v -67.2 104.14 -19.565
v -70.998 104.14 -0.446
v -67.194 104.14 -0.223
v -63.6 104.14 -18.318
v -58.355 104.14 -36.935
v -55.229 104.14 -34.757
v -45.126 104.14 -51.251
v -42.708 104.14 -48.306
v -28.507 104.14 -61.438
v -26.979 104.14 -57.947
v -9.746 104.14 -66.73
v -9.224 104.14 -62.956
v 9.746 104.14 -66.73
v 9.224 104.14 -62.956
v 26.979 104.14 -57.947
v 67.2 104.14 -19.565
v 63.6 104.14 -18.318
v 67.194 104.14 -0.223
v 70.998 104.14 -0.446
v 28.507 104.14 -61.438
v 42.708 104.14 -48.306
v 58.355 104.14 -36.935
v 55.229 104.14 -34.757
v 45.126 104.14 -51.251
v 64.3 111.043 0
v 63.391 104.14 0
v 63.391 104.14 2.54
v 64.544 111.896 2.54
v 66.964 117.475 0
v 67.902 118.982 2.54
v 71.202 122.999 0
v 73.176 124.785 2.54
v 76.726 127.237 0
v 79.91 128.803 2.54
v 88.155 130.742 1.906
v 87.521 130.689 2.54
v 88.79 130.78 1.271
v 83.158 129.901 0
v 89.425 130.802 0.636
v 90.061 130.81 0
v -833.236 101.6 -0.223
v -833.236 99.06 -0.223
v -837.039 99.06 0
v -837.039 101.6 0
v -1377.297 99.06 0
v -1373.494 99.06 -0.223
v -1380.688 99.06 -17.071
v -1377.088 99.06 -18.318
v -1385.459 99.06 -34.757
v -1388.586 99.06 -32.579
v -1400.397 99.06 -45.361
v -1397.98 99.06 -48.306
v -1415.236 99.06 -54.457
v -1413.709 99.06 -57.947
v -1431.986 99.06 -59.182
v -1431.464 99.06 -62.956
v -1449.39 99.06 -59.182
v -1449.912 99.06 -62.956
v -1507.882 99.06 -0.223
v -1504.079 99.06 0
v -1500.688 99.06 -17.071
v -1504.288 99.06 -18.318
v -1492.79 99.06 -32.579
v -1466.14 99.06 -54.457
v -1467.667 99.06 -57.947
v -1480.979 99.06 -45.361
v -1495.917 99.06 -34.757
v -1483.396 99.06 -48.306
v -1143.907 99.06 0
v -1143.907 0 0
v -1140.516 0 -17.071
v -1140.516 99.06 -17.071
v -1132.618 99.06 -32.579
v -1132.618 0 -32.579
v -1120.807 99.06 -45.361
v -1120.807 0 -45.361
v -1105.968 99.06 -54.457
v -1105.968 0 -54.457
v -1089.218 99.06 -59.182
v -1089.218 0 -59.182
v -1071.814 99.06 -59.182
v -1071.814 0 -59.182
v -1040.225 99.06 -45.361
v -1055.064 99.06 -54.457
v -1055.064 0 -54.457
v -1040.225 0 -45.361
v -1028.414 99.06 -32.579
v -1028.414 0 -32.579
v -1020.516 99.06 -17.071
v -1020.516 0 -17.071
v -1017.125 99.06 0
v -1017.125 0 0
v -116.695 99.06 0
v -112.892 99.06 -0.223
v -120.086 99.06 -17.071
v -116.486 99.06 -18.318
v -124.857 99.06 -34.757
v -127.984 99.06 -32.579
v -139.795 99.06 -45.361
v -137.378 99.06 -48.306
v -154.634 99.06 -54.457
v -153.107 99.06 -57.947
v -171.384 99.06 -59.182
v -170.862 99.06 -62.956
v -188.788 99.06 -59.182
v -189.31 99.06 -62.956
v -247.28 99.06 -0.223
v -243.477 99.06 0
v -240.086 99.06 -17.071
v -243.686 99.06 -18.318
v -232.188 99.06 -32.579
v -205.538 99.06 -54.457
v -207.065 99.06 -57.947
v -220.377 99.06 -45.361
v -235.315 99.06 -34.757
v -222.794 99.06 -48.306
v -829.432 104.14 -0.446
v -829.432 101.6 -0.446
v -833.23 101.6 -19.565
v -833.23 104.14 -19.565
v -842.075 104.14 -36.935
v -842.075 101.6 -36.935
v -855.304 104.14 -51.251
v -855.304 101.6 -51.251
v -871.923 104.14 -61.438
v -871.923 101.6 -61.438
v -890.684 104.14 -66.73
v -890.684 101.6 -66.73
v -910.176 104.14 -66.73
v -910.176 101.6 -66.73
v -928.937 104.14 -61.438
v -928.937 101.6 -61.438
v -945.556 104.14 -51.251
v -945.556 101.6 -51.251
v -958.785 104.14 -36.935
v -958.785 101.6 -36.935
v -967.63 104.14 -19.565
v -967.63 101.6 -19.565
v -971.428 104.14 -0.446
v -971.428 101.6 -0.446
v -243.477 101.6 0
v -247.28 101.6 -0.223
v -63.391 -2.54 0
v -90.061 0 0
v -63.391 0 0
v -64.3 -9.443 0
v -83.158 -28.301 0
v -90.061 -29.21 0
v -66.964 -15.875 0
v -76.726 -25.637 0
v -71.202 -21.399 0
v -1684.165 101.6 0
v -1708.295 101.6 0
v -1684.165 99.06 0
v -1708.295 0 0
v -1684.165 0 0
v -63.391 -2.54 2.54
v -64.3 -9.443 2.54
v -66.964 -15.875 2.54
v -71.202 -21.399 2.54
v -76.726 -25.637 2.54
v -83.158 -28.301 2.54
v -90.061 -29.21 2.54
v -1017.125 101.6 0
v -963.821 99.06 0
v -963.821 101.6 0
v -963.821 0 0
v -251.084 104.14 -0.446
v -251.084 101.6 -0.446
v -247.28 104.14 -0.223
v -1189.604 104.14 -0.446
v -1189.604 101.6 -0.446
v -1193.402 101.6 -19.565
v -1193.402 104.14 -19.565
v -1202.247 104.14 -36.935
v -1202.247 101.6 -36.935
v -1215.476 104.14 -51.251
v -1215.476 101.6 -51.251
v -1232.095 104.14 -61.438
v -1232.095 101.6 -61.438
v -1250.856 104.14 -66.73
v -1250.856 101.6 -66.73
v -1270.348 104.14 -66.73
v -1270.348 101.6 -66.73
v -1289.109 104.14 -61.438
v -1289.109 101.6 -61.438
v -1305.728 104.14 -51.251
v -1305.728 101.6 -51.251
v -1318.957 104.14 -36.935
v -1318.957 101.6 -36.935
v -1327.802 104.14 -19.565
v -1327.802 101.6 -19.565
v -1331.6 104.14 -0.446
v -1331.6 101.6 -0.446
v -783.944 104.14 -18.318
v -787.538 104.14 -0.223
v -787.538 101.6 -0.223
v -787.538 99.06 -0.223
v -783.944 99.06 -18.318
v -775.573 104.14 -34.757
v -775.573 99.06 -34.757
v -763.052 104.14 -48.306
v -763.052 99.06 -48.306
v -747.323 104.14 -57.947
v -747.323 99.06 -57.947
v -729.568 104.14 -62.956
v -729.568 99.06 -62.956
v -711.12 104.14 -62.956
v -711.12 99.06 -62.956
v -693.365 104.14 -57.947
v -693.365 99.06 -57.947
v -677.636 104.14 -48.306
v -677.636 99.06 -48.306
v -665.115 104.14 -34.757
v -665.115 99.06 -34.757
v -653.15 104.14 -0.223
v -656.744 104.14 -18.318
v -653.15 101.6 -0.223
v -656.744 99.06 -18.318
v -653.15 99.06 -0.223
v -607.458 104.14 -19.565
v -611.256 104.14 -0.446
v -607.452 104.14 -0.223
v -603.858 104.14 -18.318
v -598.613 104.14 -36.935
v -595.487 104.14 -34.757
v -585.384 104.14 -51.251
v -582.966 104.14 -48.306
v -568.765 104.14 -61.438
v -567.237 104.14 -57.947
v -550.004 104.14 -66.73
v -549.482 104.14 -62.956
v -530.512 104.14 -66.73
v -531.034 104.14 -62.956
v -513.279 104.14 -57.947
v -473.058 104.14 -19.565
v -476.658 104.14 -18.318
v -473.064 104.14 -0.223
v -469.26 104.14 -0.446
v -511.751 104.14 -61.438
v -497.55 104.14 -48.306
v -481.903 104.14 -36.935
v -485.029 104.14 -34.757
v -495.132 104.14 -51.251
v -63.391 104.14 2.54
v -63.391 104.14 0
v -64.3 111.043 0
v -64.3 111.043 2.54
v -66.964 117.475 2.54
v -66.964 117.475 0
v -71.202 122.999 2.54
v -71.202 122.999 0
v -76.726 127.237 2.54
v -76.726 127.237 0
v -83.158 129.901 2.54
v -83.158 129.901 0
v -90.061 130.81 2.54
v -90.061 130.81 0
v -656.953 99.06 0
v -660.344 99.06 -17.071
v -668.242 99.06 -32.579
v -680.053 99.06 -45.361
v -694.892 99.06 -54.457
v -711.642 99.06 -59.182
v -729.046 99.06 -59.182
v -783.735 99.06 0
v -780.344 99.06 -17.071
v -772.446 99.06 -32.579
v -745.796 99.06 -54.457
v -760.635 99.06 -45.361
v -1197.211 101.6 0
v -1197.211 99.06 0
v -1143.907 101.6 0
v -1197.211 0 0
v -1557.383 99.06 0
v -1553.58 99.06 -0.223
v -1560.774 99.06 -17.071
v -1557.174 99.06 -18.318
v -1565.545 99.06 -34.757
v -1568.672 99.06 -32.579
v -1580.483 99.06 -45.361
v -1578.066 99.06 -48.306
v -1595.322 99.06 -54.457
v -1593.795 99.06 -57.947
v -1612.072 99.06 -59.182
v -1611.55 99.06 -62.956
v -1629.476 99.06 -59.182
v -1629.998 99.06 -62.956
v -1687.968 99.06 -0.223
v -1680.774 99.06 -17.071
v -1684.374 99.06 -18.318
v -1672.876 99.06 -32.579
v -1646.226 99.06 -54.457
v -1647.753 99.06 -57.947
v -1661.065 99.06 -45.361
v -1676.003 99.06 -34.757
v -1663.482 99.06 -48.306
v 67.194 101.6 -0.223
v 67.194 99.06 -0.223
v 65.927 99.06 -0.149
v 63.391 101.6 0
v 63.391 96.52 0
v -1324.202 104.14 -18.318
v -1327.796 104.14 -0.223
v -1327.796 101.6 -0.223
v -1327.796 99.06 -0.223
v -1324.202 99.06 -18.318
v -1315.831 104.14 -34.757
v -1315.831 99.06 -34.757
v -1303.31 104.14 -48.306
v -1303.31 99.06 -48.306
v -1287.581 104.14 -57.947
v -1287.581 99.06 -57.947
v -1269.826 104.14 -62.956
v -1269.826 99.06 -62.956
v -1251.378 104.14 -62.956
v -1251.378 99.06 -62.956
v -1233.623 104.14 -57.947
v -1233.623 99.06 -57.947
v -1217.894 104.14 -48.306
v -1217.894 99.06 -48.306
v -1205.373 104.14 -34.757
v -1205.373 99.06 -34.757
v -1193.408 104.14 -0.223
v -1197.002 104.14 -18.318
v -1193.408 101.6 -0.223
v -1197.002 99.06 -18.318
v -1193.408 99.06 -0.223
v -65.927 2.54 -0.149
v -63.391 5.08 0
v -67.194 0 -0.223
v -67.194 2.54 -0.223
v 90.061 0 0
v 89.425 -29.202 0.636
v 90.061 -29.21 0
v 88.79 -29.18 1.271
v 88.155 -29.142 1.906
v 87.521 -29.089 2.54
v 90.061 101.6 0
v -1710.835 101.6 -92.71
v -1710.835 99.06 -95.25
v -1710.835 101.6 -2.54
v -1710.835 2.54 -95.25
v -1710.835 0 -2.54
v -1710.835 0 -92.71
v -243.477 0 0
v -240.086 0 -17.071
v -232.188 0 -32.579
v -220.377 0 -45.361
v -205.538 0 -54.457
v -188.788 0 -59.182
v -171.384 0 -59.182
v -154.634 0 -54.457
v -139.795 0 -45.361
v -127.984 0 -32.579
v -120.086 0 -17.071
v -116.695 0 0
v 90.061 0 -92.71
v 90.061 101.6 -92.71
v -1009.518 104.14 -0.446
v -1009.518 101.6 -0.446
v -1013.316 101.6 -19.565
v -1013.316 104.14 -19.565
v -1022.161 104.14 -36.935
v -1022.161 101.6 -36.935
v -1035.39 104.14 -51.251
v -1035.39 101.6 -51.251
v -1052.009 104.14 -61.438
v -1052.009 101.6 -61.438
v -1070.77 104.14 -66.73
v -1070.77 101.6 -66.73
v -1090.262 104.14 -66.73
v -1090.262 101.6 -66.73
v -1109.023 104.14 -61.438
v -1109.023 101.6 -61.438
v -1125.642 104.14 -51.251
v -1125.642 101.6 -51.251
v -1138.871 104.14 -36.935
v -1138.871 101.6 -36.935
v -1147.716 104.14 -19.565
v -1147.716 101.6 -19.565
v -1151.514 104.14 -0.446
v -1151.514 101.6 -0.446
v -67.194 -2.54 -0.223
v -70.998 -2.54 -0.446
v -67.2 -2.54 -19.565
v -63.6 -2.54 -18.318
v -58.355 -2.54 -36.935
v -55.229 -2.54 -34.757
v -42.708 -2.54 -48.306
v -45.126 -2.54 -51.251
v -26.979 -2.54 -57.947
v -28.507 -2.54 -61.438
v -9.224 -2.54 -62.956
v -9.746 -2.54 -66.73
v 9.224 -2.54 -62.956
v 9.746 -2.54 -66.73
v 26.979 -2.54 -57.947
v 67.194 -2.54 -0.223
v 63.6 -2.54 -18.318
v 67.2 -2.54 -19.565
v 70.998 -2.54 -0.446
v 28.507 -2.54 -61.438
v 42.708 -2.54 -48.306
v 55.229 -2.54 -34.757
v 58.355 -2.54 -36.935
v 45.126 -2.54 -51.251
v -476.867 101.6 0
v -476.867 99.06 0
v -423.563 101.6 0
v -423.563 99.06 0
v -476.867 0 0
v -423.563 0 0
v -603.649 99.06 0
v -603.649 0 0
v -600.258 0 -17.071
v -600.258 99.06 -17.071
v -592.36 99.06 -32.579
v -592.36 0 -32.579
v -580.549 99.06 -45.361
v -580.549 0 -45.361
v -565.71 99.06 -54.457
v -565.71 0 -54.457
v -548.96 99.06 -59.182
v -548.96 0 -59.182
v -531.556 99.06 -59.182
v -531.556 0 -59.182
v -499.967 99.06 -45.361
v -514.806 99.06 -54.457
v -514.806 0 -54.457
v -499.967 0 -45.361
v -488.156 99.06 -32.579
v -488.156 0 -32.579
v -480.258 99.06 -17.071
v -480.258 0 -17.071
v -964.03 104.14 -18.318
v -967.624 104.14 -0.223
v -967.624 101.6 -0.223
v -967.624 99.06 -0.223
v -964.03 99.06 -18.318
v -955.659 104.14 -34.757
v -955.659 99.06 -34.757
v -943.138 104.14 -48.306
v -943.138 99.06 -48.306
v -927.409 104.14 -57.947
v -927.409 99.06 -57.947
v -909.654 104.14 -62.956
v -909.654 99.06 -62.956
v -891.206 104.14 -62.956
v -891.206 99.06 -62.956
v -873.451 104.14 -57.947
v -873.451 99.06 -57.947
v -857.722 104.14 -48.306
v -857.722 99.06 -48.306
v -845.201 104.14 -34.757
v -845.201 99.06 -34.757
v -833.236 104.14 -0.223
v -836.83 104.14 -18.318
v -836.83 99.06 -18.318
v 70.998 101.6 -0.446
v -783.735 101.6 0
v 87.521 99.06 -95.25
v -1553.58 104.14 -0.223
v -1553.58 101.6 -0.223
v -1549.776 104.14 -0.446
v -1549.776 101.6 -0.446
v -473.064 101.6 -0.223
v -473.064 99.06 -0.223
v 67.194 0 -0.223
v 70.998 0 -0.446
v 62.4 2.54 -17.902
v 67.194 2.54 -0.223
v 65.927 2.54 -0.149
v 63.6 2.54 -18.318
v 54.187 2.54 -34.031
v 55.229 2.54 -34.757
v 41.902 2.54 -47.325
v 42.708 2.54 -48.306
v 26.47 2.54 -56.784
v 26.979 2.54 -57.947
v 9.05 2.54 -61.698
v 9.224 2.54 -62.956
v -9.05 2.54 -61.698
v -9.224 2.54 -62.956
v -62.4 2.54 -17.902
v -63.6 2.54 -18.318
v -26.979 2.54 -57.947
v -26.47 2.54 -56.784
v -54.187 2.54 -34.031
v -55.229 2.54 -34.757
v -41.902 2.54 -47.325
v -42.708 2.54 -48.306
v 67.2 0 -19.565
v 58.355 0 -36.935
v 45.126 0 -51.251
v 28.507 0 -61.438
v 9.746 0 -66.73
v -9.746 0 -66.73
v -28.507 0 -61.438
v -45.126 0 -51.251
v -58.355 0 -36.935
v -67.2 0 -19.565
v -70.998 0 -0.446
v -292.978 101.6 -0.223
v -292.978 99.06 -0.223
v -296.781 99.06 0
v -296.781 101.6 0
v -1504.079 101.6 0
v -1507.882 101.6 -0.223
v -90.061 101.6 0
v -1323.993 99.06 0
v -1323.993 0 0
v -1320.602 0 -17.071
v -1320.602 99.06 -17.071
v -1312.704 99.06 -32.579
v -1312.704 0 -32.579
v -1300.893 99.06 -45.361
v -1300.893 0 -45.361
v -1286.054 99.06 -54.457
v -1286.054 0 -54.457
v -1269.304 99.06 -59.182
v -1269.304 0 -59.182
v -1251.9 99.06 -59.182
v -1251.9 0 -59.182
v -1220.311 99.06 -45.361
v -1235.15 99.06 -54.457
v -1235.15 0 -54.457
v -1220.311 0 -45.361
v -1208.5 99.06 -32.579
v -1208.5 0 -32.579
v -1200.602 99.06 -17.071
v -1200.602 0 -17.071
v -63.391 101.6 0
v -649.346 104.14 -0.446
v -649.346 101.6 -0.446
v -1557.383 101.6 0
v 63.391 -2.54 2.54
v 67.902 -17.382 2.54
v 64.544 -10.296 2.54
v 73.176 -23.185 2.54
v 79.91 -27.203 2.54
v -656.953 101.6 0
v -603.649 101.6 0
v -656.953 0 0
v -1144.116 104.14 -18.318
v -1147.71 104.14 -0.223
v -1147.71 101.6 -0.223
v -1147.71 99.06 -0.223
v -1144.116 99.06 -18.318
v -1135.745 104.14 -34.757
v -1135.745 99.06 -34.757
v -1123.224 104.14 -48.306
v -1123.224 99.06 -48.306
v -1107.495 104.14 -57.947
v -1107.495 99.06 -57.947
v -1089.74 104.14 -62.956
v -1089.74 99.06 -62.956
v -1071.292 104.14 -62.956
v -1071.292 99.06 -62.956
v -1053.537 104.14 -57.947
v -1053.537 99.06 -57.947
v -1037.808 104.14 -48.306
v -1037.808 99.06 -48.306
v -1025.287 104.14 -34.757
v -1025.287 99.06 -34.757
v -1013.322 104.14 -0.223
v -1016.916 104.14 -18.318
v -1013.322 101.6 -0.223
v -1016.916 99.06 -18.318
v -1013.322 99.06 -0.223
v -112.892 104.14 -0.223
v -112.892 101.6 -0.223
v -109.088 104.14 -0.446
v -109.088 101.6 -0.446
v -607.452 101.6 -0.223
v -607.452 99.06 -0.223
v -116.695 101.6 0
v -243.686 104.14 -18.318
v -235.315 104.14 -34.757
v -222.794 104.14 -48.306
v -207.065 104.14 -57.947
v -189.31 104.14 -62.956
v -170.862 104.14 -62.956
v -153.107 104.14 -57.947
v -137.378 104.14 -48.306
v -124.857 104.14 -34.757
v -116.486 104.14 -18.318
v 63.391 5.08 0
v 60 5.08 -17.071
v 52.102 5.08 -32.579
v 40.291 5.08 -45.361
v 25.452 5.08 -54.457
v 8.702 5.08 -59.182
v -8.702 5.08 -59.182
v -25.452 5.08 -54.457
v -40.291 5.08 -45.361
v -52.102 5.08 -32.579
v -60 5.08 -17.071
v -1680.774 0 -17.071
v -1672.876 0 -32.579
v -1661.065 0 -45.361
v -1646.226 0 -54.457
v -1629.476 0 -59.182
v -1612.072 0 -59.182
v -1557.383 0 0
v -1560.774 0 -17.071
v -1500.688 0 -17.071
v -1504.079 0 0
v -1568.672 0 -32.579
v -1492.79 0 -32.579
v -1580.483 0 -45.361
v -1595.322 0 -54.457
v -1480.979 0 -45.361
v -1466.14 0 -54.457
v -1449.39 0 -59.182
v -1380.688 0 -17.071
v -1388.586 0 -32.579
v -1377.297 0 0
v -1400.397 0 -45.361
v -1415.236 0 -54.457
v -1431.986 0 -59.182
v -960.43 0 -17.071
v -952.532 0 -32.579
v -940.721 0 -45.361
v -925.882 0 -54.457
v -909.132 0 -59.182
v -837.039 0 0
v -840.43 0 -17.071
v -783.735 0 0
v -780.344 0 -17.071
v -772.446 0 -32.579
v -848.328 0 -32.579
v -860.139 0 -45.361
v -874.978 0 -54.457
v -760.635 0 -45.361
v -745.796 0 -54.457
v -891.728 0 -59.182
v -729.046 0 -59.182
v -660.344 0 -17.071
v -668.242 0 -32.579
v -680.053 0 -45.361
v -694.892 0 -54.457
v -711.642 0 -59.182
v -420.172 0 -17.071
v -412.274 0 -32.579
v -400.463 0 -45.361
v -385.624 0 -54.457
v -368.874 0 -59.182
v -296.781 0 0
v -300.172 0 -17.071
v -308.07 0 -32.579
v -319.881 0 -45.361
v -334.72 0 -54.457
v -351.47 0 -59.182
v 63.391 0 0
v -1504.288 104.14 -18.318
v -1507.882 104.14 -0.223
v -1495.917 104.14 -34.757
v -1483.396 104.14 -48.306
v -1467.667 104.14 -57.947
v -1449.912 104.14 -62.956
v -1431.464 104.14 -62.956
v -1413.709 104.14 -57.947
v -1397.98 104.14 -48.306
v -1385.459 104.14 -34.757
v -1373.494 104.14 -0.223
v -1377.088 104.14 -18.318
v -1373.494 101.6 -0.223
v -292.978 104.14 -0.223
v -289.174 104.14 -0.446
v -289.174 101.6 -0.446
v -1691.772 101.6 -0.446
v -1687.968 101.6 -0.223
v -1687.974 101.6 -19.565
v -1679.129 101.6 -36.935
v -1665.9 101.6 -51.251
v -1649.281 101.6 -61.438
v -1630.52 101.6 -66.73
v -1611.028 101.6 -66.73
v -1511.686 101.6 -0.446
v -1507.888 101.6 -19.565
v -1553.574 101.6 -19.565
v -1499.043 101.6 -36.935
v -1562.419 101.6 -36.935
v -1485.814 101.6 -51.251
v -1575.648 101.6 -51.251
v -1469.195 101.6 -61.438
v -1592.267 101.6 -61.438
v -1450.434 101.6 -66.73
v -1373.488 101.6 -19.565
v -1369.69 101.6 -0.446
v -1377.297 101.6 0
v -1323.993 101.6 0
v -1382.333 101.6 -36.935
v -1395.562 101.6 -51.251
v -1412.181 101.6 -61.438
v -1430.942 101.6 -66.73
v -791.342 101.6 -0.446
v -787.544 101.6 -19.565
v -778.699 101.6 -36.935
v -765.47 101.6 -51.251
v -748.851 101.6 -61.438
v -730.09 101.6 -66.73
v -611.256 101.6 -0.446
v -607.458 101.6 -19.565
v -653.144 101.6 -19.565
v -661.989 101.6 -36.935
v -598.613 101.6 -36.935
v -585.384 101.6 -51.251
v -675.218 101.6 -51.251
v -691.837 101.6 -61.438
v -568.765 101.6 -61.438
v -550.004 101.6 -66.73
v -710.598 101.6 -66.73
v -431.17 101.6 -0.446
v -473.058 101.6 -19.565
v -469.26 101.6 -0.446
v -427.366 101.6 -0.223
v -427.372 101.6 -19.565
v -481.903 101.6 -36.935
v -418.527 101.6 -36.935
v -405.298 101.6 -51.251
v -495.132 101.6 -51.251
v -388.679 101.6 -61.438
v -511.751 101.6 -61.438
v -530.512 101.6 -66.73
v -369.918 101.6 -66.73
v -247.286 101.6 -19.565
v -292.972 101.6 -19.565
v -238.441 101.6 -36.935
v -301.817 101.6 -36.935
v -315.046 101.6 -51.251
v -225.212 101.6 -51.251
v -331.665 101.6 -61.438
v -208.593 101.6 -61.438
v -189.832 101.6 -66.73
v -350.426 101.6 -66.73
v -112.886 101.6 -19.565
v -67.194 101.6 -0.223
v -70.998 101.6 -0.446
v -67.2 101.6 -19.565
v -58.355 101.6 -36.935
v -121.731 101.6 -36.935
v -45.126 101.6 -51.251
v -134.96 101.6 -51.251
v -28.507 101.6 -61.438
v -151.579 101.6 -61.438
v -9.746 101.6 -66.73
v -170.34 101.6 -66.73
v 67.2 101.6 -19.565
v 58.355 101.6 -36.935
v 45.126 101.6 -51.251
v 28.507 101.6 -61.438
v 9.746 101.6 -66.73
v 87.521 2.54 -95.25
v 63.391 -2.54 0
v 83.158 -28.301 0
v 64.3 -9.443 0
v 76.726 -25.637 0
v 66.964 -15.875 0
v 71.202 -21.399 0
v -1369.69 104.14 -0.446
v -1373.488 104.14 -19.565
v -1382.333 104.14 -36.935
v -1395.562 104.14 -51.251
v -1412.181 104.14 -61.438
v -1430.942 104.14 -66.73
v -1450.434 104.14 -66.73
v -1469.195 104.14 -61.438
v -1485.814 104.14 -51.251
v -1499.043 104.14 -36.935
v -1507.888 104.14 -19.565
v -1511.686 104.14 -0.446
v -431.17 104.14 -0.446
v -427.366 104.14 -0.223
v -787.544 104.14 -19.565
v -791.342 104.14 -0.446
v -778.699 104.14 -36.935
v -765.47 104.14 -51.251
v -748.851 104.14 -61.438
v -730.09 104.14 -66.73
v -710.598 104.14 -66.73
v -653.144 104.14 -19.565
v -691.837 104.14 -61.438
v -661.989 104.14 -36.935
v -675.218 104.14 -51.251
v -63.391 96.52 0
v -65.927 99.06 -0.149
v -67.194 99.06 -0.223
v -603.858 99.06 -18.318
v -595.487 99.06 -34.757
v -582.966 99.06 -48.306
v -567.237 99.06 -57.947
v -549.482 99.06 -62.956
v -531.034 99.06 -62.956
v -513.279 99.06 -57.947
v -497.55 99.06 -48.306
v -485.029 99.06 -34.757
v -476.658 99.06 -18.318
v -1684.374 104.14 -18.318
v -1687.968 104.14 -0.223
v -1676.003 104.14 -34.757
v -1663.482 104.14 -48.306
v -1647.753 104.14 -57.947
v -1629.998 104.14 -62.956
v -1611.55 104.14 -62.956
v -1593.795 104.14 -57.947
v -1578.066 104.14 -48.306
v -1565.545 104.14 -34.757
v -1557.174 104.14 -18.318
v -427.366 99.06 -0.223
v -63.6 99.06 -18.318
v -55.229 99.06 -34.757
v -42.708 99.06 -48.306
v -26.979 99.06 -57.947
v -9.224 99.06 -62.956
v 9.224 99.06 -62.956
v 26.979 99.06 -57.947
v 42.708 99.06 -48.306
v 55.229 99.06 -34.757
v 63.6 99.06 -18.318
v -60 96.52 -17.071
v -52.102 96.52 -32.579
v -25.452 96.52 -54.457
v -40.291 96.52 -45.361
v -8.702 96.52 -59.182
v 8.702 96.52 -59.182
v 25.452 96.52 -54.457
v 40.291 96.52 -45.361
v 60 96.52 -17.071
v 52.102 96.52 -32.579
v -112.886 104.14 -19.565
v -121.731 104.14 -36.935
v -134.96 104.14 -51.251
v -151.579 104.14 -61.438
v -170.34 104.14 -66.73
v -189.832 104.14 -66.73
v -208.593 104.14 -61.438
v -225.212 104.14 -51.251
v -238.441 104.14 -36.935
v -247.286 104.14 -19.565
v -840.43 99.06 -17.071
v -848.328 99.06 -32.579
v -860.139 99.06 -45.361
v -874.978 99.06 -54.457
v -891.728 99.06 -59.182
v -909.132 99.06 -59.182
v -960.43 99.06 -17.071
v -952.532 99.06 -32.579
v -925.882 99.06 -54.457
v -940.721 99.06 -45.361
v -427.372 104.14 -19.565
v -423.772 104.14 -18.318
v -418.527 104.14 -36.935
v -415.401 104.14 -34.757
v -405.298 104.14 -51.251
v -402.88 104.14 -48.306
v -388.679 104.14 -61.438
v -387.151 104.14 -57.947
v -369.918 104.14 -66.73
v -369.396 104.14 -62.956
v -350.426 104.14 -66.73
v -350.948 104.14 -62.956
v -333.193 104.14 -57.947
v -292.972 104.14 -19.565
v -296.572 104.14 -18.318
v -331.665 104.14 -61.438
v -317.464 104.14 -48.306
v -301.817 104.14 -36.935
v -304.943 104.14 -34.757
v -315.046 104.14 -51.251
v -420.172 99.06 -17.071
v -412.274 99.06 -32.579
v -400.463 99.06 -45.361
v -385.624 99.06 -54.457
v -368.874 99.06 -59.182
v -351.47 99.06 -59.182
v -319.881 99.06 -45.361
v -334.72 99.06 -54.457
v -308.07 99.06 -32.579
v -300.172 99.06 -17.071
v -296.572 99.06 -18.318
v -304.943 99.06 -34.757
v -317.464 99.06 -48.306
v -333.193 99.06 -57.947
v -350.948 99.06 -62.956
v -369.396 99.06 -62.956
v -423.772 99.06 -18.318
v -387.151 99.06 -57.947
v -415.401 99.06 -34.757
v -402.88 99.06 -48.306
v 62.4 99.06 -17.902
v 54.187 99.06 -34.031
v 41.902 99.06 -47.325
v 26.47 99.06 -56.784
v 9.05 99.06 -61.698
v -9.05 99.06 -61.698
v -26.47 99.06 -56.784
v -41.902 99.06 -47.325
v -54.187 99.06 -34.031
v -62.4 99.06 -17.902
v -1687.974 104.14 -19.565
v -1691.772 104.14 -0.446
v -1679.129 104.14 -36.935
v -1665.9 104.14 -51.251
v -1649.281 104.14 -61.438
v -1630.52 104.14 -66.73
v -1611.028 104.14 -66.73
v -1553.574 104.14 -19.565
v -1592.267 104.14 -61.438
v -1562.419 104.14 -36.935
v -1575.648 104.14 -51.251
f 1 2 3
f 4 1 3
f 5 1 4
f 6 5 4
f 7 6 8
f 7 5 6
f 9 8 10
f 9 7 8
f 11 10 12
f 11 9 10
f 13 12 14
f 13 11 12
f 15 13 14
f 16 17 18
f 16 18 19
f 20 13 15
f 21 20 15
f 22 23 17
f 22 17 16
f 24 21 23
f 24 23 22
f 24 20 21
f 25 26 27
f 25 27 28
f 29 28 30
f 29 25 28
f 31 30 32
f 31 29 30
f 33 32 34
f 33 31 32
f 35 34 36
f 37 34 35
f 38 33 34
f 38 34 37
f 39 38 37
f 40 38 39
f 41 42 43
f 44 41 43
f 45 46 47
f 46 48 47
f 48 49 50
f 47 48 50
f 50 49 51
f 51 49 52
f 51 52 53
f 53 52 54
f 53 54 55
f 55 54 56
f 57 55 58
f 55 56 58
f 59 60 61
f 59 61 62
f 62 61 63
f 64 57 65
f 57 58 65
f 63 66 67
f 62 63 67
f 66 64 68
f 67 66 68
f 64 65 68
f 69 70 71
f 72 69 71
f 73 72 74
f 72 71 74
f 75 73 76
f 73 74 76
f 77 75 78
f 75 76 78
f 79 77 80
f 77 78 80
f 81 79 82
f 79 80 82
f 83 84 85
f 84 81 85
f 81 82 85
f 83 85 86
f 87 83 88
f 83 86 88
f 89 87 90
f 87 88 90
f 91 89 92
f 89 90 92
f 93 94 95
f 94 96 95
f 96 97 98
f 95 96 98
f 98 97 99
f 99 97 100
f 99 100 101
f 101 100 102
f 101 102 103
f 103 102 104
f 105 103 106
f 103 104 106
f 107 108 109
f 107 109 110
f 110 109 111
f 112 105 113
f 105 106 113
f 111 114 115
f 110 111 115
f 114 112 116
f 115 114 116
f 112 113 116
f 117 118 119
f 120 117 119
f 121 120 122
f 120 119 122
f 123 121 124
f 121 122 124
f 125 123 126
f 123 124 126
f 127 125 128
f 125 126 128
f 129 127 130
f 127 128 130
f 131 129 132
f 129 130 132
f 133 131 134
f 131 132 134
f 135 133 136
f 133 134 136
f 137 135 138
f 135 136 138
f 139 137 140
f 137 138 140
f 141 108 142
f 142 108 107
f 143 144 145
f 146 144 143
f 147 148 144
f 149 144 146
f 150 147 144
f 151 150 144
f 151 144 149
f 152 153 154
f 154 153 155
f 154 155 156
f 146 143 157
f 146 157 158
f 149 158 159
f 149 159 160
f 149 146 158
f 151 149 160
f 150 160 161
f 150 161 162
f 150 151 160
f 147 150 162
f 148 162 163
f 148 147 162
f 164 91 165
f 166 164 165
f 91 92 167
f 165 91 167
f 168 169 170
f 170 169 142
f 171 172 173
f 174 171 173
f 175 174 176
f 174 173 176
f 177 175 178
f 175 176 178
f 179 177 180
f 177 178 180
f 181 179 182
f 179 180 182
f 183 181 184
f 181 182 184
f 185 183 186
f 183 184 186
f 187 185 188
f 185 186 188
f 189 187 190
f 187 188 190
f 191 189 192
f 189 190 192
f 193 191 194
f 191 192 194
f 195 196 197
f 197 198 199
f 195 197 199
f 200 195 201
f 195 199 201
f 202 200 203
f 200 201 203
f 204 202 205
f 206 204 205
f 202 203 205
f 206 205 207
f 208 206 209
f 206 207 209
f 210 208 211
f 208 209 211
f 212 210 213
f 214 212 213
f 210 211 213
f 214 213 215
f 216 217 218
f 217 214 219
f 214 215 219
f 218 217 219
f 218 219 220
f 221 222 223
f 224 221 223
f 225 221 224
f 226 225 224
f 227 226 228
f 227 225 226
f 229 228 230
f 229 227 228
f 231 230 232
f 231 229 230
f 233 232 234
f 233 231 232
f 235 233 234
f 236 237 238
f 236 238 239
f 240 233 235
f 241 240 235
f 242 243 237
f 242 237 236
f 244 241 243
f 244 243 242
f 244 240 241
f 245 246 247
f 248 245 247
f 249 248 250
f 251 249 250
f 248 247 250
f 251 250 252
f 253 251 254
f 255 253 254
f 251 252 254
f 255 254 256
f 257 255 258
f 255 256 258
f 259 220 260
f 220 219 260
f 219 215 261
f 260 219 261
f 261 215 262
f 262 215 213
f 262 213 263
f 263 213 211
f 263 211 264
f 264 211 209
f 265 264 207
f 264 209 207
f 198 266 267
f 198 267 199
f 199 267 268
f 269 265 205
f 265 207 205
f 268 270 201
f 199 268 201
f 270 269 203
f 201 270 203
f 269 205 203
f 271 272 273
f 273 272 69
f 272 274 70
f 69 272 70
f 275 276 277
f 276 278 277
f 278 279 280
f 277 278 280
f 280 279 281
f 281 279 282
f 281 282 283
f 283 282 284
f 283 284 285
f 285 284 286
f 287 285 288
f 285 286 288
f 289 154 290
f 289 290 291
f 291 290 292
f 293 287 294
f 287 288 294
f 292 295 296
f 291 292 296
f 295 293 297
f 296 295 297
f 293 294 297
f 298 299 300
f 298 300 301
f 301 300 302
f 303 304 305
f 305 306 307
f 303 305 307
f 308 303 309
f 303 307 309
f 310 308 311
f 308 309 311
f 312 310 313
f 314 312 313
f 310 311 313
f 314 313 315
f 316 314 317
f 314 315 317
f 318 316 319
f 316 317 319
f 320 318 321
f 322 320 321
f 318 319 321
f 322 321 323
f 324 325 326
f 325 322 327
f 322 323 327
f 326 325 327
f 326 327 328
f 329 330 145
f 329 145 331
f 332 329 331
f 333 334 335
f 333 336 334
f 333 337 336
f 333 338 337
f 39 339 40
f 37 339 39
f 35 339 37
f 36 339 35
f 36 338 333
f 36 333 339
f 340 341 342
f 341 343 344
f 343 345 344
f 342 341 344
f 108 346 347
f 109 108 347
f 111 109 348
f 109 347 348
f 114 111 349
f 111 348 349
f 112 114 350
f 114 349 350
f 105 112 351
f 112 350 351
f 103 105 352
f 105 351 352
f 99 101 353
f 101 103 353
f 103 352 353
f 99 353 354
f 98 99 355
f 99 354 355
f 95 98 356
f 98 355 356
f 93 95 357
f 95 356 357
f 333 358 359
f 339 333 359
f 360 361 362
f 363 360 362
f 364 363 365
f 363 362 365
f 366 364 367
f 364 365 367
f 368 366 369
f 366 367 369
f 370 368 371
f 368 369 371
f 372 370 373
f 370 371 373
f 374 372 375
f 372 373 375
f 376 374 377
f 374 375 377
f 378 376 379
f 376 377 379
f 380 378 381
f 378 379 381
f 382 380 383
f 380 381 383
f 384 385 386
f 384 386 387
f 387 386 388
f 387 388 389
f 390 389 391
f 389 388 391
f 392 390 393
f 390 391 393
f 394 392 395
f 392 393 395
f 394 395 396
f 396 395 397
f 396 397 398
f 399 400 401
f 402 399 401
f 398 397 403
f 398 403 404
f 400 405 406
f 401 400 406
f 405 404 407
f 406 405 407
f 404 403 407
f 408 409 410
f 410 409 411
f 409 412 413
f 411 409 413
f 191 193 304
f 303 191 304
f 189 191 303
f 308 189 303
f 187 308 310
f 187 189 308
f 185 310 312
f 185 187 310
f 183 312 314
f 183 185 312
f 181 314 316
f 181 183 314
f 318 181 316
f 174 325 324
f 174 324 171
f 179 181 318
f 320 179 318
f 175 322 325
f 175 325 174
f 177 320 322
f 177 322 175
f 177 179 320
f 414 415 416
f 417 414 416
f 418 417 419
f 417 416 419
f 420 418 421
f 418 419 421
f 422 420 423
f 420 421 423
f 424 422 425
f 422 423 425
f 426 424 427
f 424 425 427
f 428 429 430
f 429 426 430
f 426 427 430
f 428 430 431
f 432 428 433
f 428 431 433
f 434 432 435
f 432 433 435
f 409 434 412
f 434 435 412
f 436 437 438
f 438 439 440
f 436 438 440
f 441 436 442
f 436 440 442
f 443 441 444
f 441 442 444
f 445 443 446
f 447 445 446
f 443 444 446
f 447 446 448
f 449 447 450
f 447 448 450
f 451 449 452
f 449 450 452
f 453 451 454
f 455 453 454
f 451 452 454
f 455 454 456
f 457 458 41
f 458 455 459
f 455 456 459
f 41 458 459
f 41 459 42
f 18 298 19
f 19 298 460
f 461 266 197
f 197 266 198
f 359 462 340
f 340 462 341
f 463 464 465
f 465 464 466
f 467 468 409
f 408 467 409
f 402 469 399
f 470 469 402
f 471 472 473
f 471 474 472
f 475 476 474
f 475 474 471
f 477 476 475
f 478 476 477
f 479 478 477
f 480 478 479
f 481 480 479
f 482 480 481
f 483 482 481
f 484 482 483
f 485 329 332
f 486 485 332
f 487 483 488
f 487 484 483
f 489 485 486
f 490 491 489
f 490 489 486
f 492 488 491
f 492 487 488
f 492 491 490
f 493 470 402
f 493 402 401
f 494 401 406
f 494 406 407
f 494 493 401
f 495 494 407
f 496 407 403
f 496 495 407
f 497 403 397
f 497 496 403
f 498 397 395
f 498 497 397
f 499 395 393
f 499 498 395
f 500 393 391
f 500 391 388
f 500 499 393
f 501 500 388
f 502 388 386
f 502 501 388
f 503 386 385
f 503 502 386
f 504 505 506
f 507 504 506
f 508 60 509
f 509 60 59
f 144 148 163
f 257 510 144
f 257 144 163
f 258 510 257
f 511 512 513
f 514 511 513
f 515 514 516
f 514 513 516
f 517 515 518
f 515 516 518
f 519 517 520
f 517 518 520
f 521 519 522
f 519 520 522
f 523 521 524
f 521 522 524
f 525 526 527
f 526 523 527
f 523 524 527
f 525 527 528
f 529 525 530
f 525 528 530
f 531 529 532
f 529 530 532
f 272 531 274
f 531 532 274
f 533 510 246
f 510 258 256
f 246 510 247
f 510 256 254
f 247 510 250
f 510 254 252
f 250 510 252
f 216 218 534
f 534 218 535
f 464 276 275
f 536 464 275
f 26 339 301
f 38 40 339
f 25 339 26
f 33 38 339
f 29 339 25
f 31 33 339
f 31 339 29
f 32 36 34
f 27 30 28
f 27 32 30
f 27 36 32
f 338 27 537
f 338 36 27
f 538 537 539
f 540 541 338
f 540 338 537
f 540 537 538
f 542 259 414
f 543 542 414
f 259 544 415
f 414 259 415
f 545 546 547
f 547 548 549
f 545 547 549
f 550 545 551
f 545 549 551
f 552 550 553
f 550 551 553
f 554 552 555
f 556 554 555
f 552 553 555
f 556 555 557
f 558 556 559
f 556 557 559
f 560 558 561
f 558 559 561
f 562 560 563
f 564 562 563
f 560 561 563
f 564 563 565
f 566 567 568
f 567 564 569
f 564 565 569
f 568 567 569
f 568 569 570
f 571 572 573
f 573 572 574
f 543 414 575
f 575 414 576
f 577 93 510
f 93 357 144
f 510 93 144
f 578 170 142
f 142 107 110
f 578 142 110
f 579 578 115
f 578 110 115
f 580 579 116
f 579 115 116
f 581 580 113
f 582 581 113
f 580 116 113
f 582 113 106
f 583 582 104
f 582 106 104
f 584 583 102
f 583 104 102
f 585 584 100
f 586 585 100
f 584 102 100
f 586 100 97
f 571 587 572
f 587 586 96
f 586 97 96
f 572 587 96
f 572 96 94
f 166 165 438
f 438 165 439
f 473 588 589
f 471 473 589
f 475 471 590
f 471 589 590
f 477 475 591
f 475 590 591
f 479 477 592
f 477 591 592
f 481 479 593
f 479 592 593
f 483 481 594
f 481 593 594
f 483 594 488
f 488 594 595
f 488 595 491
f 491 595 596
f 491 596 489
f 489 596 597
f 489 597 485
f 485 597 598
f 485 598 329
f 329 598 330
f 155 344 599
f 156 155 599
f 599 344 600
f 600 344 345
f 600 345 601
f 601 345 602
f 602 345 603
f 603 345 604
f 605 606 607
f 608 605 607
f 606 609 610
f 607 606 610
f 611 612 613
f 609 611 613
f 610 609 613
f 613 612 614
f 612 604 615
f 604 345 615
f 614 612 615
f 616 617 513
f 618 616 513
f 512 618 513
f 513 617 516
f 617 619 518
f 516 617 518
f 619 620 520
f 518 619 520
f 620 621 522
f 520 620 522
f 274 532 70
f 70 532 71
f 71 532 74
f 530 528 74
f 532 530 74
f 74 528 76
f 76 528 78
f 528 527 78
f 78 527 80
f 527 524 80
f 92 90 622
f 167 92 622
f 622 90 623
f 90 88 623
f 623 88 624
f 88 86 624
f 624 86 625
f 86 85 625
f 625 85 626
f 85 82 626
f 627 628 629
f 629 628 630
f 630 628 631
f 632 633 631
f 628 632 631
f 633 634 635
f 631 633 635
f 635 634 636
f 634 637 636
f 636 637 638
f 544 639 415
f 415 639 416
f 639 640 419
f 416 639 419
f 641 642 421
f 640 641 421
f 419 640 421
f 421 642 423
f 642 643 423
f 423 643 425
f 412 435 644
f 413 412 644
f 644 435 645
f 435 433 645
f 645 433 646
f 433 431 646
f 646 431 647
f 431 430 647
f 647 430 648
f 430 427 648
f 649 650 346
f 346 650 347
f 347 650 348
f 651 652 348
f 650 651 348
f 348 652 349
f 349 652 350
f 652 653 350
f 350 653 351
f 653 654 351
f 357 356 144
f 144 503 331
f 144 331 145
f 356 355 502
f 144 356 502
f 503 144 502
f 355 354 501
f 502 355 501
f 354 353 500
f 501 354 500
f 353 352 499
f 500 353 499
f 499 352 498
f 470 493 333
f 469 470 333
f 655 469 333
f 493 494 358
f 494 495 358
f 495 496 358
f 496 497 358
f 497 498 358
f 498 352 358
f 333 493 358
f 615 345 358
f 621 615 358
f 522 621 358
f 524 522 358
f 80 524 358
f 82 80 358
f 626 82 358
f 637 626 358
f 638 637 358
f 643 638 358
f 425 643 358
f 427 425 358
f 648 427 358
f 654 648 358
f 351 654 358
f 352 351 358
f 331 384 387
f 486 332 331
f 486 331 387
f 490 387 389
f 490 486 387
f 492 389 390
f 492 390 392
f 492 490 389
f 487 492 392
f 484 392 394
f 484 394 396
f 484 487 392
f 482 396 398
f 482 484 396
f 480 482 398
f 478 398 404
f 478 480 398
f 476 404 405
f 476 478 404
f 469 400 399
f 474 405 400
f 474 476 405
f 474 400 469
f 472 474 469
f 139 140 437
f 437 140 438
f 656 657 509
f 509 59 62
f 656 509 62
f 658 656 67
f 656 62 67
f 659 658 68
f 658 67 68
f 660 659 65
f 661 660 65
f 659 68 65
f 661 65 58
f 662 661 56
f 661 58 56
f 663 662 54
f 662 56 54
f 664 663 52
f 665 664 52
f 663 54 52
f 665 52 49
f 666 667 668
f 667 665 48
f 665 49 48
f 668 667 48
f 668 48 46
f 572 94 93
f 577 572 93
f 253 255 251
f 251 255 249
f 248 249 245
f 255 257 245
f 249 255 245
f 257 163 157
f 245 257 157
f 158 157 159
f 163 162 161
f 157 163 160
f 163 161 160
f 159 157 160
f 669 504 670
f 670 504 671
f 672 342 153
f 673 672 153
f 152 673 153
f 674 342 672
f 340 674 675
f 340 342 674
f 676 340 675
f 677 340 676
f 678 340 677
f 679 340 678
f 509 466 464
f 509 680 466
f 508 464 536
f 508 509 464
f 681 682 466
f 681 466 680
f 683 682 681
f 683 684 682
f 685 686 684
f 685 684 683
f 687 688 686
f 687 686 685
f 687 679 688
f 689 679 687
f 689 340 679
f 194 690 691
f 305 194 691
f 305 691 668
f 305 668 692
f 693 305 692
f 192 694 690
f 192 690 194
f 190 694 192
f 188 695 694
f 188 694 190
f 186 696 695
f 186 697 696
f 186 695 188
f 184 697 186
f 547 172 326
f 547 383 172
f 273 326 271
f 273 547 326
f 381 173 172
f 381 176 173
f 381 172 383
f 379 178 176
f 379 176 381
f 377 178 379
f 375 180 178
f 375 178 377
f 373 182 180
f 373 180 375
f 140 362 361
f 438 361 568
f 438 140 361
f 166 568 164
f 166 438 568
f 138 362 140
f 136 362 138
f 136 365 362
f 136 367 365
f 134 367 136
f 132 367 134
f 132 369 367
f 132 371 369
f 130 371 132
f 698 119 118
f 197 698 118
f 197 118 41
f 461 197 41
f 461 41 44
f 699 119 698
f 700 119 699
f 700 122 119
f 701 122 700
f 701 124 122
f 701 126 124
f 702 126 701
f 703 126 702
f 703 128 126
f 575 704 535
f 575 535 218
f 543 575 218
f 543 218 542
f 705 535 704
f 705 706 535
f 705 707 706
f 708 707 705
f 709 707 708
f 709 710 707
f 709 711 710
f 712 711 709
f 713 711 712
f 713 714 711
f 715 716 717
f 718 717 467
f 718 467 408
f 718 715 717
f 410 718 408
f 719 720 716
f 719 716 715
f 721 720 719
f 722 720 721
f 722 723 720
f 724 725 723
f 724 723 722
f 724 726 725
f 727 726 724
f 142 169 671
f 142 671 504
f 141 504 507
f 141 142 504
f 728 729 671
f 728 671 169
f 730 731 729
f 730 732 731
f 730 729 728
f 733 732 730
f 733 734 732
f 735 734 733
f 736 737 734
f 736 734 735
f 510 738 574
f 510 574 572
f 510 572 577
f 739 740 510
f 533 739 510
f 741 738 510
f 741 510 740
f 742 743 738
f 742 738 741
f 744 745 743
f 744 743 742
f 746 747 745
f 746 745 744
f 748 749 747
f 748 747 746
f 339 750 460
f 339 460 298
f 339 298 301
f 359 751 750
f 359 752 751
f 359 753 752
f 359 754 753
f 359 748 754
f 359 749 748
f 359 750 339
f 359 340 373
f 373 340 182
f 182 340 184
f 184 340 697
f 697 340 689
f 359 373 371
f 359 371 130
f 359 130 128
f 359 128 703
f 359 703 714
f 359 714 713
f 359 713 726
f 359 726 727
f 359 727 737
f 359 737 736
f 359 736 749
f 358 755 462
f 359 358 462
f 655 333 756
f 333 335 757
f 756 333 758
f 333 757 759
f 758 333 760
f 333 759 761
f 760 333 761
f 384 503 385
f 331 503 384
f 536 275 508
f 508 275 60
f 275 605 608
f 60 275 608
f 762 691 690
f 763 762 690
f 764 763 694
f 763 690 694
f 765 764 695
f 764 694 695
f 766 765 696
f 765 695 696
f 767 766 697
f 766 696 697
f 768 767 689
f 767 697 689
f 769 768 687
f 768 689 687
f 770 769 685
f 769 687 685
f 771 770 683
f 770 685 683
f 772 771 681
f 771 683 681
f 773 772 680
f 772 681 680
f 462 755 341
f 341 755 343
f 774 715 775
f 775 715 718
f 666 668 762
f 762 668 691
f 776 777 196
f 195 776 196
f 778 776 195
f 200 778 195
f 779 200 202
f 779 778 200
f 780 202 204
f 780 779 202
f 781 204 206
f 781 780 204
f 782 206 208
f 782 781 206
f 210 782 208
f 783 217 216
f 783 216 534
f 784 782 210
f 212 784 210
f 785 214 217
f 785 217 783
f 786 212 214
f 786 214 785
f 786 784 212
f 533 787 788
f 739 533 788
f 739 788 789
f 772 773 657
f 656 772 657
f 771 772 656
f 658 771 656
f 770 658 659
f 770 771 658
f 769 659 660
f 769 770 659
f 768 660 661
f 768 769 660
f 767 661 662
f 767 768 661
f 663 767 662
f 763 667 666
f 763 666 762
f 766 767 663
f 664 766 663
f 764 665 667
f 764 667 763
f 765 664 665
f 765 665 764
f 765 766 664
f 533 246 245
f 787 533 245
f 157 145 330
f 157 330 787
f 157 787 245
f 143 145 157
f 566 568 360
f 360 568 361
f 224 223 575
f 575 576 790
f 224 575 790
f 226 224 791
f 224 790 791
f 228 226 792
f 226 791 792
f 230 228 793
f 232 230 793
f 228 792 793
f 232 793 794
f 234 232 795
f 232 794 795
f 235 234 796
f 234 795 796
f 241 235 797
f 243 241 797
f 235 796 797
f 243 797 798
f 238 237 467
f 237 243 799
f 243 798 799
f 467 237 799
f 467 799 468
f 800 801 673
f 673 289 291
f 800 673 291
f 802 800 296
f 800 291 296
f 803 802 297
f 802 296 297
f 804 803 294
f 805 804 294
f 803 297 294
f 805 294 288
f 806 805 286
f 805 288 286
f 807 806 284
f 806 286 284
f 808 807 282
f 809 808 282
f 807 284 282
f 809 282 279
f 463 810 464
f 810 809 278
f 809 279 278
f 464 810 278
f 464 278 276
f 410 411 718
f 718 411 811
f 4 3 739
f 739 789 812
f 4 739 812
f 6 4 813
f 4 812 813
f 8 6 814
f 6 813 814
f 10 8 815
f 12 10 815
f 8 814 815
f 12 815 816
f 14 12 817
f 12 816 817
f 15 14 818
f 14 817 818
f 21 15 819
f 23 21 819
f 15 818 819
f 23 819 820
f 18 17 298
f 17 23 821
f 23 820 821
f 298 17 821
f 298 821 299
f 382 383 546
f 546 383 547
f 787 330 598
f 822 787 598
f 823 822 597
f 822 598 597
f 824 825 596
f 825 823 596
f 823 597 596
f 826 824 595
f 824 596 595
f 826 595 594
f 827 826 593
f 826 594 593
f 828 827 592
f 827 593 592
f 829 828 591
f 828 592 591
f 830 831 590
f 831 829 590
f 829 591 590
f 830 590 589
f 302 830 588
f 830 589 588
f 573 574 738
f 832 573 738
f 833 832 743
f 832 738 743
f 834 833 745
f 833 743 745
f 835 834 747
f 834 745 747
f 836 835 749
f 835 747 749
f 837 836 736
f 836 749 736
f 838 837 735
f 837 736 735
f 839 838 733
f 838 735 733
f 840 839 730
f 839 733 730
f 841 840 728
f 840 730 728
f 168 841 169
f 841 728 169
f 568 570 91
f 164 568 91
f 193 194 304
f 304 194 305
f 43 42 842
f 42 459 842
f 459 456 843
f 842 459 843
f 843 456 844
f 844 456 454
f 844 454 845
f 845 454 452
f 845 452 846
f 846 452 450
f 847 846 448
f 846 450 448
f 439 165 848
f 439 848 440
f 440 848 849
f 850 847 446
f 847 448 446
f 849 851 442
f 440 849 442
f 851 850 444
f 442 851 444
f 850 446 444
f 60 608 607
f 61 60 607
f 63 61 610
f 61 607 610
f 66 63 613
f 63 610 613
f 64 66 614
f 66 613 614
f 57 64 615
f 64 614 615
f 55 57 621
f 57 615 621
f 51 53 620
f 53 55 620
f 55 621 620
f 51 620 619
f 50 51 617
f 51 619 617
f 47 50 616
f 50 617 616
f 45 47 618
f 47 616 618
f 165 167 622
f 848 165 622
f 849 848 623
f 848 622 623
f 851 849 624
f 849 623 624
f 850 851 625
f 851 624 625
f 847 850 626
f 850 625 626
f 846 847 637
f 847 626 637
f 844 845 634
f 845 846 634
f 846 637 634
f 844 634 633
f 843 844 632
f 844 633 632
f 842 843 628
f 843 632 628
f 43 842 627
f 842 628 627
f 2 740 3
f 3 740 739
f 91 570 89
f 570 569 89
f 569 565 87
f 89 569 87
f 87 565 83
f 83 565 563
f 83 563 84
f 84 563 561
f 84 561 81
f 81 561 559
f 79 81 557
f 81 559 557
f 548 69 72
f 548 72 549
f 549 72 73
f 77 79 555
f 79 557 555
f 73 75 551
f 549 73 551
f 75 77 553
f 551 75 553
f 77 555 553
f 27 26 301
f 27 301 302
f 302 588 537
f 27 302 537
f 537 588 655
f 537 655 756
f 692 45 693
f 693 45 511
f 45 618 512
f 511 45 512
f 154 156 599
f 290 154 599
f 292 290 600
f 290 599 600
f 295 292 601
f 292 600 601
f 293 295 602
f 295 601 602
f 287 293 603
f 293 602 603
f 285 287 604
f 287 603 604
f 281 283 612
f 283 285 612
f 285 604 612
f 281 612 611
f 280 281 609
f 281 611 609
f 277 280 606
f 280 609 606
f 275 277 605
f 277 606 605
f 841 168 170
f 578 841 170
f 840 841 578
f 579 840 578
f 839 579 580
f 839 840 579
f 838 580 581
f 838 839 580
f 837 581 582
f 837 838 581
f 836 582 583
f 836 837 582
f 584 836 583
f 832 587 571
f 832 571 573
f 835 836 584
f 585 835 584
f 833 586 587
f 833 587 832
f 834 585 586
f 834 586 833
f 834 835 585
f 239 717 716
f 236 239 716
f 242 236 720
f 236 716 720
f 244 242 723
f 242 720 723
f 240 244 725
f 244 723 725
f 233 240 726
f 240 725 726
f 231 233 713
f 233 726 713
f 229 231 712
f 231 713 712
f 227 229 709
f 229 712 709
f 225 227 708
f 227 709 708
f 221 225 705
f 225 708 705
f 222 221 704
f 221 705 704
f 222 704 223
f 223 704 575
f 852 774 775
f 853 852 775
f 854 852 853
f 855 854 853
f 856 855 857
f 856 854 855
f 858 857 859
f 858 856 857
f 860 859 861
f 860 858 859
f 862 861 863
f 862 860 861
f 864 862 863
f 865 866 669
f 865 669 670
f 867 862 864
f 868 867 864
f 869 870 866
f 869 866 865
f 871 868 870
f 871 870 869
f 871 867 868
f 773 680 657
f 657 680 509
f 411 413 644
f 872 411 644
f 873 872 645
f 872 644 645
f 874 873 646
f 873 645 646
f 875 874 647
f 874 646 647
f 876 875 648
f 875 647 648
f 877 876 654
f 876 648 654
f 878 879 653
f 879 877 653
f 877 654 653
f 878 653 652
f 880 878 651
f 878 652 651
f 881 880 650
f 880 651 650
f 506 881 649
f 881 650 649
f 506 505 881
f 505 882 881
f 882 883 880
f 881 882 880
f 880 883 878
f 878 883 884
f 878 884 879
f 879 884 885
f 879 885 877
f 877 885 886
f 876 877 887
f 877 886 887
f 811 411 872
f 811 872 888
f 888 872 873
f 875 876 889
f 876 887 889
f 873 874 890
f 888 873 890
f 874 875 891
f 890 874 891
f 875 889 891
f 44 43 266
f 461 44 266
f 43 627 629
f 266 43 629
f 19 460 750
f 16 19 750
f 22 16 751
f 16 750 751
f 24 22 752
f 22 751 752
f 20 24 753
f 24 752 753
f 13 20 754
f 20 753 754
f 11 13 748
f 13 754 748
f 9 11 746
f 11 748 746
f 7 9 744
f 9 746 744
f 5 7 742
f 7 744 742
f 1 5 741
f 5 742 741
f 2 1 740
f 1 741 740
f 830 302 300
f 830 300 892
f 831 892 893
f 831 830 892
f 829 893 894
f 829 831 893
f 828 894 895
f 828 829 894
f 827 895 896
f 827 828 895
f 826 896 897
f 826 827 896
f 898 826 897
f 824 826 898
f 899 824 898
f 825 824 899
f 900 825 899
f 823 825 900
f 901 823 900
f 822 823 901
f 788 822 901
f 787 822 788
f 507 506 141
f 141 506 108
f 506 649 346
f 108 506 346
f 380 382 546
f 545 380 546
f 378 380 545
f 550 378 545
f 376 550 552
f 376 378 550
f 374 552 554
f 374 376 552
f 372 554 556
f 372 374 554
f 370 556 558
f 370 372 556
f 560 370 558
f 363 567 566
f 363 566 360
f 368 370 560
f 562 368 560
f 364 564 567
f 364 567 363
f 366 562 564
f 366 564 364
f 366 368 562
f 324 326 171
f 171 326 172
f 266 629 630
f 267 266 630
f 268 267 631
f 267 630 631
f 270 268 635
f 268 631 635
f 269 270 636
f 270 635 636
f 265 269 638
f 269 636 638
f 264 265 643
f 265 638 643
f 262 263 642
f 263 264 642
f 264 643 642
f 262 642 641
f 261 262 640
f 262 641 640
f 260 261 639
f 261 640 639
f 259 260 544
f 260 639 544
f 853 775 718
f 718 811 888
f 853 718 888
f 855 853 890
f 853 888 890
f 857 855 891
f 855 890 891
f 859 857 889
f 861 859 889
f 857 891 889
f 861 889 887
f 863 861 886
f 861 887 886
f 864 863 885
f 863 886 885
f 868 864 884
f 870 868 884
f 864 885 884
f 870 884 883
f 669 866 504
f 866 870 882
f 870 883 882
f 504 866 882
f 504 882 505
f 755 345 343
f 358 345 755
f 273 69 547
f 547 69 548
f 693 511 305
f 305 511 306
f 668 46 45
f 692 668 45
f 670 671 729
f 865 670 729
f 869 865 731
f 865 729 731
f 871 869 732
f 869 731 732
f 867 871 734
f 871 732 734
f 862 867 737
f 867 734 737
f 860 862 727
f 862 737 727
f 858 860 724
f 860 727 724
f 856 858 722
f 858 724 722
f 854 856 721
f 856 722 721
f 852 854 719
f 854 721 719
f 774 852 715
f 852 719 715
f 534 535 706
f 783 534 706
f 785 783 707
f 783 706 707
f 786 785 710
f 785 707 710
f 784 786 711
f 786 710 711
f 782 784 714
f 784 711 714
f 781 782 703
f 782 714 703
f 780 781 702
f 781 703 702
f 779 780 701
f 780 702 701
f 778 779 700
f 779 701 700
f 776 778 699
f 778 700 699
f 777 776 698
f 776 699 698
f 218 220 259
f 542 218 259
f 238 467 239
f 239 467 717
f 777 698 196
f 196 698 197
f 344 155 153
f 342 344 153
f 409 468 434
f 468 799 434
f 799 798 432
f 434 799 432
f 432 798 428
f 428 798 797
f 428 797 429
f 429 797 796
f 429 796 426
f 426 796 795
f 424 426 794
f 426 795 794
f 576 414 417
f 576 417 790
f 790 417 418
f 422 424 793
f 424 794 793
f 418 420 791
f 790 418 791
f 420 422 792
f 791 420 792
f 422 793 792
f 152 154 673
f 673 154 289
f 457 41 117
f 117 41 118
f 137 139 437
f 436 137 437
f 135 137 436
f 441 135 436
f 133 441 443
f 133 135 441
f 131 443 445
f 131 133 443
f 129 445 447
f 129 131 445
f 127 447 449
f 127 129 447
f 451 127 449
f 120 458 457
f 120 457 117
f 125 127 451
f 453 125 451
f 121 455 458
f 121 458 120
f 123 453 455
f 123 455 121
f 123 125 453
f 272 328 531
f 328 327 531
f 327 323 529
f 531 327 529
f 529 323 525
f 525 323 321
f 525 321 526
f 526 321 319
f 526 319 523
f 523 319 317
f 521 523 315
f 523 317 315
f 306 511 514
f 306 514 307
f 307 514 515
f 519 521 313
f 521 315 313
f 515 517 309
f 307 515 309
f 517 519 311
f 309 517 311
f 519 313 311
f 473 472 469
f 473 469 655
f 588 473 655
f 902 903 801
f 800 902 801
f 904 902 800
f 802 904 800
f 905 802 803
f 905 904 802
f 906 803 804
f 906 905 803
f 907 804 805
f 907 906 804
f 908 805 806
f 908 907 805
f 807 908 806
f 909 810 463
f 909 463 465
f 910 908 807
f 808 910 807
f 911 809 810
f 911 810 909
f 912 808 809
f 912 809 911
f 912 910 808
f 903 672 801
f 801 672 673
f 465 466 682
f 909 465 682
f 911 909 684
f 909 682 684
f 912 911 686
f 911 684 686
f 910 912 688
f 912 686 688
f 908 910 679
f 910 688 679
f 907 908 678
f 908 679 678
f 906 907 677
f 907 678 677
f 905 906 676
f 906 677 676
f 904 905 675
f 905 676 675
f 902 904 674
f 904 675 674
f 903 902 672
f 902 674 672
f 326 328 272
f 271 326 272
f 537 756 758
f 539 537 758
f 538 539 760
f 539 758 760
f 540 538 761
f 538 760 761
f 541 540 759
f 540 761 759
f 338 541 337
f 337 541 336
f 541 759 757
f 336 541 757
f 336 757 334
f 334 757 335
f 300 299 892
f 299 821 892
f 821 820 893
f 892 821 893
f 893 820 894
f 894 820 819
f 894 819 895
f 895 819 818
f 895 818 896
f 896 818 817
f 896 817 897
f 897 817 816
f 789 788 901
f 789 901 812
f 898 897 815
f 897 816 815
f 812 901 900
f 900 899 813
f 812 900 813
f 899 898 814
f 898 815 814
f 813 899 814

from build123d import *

# Parameters (mm, degrees)
BOSS_EXTRUDE1_DEPTH      = 101.6
CUT_EXTRUDE1_START       = -2.54
CUT_EXTRUDE1_DEPTH       = 2.54
BOSS_EXTRUDE2_DEPTH      = 2.54
CHAMFER2_SIZE            = 2.54
BOSS_EXTRUDE5_DEPTH      = 2.54
CHAMFER2_OF_MIRROR1_SIZE = 2.54
MIRROR3_COPY_1_DEPTH     = 2.54
MIRROR3_COPY_2_DEPTH     = 2.54
LPATTERN14_COUNT         = 10
LPATTERN14_PITCH         = 180.086
CHAMFER3_SIZE            = 2.54
CHAMFER4_SIZE            = 2.54


with BuildPart() as part:
    # Sketch1 → Boss-Extrude1 (new body)
    with BuildSketch(Plane(origin=(0, 0, 0), x_dir=(1, 0, 0), z_dir=(0, 1, 0))):
        with BuildLine():
            Line((63.390989336, 0), (90.060989336, 0))
            Line((90.060989336, 0), (90.060989336, 95.25))
            Line((90.060989336, 95.25), (-90.060989336, 95.25))
            Line((-90.060989336, 95.25), (-90.060989336, 0))
            Line((-90.060989336, 0), (-63.390989336, 0))
            ThreePointArc((-63.390989336, 0), (0, 59.780796989), (63.390989336, 0))
        make_face()
    boss_extrude1 = extrude(amount=BOSS_EXTRUDE1_DEPTH)

    # Sketch2 → Cut-Extrude1 (cut)
    with BuildSketch(Plane(origin=(0, 101.6, 0), x_dir=(1, 0, 0), z_dir=(0, 1, 0)).offset(CUT_EXTRUDE1_START)):
        with BuildLine():
            Line((67.194448696, 0.223152181), (63.390989336, 0))
            ThreePointArc((63.390989336, 0), (0, 59.780796989), (-63.390989336, 0))
            Line((-63.390989336, 0), (-67.194448696, 0.223152181))
            ThreePointArc((-67.194448696, 0.223152181), (0, 63.590796989), (67.194448696, 0.223152181))
        make_face()
    cut_extrude1 = extrude(amount=CUT_EXTRUDE1_DEPTH, mode=Mode.SUBTRACT)

    # Sketch3 → Boss-Extrude2 (add)
    with BuildSketch(Plane(origin=(0, 101.6, 0), x_dir=(1, 0, 0), z_dir=(0, 1, 0))):
        with BuildLine():
            Line((-70.997908056, 0.446304361), (-67.194448696, 0.223152181))
            ThreePointArc((-67.194448696, 0.223152181), (0, 63.590796989), (67.194448696, 0.223152181))
            Line((67.194448696, 0.223152181), (70.997908056, 0.446304361))
            ThreePointArc((70.997908056, 0.446304361), (0, 67.400796989), (-70.997908056, 0.446304361))
        make_face()
    boss_extrude2 = extrude(amount=BOSS_EXTRUDE2_DEPTH)

    # Chamfer2
    chamfer2_edges = [part.edges().sort_by_distance(p)[0] for p in [
        (0, 99.06, -59.780796989),
    ]]
    chamfer(chamfer2_edges, length=CHAMFER2_SIZE)

    # Sketch4 → Boss-Extrude5 (add)
    with BuildSketch(Plane.XY):
        with BuildLine():
            Line((-90.060989336, 50.8), (-63.390989336, 50.8))
            Line((-63.390989336, 50.8), (-63.390989336, 104.14))
            ThreePointArc((-63.390989336, 104.14), (-71.202451482, 122.998537854), (-90.060989336, 130.81))
            Line((-90.060989336, 130.81), (-90.060989336, 50.8))
        make_face()
    boss_extrude5 = extrude(amount=BOSS_EXTRUDE5_DEPTH)

    # Mirror1: Cut-Extrude1, Boss-Extrude2, Boss-Extrude5 across plane
    add(cut_extrude1.mirror(Plane.ZX.offset(50.8)), mode=Mode.SUBTRACT)
    add(boss_extrude2.mirror(Plane.ZX.offset(50.8)))
    add(boss_extrude5.mirror(Plane.ZX.offset(50.8)))

    # Chamfer2 of Mirror1
    chamfer2_of_mirror1_edges = [part.edges().sort_by_distance(p)[0] for p in [
        (0, 2.54, -59.780796989),
    ]]
    chamfer(chamfer2_of_mirror1_edges, length=CHAMFER2_OF_MIRROR1_SIZE)

    # Mirror2: Boss-Extrude5 across plane
    add(boss_extrude5.mirror(Plane(origin=(0, 0, 0), x_dir=(0, 0, 1), z_dir=(1, 0, 0))))

    # Mirror3 copy 1 sketch → Mirror3 copy 1 (add)
    with BuildSketch(Plane(origin=(0, 101.6, 0), x_dir=(-1, 0, 0), z_dir=(0, 0, 1))):
        with BuildLine():
            Line((-90.060989336, 50.8), (-63.390989336, 50.8))
            Line((-63.390989336, 50.8), (-63.390989336, 104.14))
            ThreePointArc((-63.390989336, 104.14), (-71.202451482, 122.998537854), (-90.060989336, 130.81))
            Line((-90.060989336, 130.81), (-90.060989336, 50.8))
        make_face()
    extrude(amount=MIRROR3_COPY_1_DEPTH)

    # Mirror3 copy 2 sketch → Mirror3 copy 2 (add)
    with BuildSketch(Plane(origin=(0, 101.6, 0), x_dir=(1, 0, 0), z_dir=(0, 0, 1))):
        with BuildLine():
            Line((-90.060989336, -50.8), (-63.390989336, -50.8))
            Line((-63.390989336, -50.8), (-63.390989336, -104.14))
            ThreePointArc((-63.390989336, -104.14), (-71.202451482, -122.998537854), (-90.060989336, -130.81))
            Line((-90.060989336, -130.81), (-90.060989336, -50.8))
        make_face()
    extrude(amount=MIRROR3_COPY_2_DEPTH)

    # LPattern14: Boss-Extrude1, Cut-Extrude1, Boss-Extrude2 ×10
    with Locations(*[(-i * LPATTERN14_PITCH, 0, 0) for i in range(1, LPATTERN14_COUNT)]):
        add(boss_extrude1)
        add(cut_extrude1, mode=Mode.SUBTRACT)
        add(boss_extrude2)

    # Chamfer3
    chamfer3_edges = [part.edges().sort_by_distance(p)[0] for p in [
        (-810.387, 101.6, -95.25),
    ]]
    chamfer(chamfer3_edges, length=CHAMFER3_SIZE)

    # Chamfer4
    chamfer4_edges = [part.edges().sort_by_distance(p)[0] for p in [
        (90.060989336, 50.8, 2.54),
        (-1710.834989336, 50.8, 0),
        (90.060989336, 49.53, -95.25),
        (-810.387, 0, -95.25),
    ]]
    chamfer(chamfer4_edges, length=CHAMFER4_SIZE)


solid = part.part
